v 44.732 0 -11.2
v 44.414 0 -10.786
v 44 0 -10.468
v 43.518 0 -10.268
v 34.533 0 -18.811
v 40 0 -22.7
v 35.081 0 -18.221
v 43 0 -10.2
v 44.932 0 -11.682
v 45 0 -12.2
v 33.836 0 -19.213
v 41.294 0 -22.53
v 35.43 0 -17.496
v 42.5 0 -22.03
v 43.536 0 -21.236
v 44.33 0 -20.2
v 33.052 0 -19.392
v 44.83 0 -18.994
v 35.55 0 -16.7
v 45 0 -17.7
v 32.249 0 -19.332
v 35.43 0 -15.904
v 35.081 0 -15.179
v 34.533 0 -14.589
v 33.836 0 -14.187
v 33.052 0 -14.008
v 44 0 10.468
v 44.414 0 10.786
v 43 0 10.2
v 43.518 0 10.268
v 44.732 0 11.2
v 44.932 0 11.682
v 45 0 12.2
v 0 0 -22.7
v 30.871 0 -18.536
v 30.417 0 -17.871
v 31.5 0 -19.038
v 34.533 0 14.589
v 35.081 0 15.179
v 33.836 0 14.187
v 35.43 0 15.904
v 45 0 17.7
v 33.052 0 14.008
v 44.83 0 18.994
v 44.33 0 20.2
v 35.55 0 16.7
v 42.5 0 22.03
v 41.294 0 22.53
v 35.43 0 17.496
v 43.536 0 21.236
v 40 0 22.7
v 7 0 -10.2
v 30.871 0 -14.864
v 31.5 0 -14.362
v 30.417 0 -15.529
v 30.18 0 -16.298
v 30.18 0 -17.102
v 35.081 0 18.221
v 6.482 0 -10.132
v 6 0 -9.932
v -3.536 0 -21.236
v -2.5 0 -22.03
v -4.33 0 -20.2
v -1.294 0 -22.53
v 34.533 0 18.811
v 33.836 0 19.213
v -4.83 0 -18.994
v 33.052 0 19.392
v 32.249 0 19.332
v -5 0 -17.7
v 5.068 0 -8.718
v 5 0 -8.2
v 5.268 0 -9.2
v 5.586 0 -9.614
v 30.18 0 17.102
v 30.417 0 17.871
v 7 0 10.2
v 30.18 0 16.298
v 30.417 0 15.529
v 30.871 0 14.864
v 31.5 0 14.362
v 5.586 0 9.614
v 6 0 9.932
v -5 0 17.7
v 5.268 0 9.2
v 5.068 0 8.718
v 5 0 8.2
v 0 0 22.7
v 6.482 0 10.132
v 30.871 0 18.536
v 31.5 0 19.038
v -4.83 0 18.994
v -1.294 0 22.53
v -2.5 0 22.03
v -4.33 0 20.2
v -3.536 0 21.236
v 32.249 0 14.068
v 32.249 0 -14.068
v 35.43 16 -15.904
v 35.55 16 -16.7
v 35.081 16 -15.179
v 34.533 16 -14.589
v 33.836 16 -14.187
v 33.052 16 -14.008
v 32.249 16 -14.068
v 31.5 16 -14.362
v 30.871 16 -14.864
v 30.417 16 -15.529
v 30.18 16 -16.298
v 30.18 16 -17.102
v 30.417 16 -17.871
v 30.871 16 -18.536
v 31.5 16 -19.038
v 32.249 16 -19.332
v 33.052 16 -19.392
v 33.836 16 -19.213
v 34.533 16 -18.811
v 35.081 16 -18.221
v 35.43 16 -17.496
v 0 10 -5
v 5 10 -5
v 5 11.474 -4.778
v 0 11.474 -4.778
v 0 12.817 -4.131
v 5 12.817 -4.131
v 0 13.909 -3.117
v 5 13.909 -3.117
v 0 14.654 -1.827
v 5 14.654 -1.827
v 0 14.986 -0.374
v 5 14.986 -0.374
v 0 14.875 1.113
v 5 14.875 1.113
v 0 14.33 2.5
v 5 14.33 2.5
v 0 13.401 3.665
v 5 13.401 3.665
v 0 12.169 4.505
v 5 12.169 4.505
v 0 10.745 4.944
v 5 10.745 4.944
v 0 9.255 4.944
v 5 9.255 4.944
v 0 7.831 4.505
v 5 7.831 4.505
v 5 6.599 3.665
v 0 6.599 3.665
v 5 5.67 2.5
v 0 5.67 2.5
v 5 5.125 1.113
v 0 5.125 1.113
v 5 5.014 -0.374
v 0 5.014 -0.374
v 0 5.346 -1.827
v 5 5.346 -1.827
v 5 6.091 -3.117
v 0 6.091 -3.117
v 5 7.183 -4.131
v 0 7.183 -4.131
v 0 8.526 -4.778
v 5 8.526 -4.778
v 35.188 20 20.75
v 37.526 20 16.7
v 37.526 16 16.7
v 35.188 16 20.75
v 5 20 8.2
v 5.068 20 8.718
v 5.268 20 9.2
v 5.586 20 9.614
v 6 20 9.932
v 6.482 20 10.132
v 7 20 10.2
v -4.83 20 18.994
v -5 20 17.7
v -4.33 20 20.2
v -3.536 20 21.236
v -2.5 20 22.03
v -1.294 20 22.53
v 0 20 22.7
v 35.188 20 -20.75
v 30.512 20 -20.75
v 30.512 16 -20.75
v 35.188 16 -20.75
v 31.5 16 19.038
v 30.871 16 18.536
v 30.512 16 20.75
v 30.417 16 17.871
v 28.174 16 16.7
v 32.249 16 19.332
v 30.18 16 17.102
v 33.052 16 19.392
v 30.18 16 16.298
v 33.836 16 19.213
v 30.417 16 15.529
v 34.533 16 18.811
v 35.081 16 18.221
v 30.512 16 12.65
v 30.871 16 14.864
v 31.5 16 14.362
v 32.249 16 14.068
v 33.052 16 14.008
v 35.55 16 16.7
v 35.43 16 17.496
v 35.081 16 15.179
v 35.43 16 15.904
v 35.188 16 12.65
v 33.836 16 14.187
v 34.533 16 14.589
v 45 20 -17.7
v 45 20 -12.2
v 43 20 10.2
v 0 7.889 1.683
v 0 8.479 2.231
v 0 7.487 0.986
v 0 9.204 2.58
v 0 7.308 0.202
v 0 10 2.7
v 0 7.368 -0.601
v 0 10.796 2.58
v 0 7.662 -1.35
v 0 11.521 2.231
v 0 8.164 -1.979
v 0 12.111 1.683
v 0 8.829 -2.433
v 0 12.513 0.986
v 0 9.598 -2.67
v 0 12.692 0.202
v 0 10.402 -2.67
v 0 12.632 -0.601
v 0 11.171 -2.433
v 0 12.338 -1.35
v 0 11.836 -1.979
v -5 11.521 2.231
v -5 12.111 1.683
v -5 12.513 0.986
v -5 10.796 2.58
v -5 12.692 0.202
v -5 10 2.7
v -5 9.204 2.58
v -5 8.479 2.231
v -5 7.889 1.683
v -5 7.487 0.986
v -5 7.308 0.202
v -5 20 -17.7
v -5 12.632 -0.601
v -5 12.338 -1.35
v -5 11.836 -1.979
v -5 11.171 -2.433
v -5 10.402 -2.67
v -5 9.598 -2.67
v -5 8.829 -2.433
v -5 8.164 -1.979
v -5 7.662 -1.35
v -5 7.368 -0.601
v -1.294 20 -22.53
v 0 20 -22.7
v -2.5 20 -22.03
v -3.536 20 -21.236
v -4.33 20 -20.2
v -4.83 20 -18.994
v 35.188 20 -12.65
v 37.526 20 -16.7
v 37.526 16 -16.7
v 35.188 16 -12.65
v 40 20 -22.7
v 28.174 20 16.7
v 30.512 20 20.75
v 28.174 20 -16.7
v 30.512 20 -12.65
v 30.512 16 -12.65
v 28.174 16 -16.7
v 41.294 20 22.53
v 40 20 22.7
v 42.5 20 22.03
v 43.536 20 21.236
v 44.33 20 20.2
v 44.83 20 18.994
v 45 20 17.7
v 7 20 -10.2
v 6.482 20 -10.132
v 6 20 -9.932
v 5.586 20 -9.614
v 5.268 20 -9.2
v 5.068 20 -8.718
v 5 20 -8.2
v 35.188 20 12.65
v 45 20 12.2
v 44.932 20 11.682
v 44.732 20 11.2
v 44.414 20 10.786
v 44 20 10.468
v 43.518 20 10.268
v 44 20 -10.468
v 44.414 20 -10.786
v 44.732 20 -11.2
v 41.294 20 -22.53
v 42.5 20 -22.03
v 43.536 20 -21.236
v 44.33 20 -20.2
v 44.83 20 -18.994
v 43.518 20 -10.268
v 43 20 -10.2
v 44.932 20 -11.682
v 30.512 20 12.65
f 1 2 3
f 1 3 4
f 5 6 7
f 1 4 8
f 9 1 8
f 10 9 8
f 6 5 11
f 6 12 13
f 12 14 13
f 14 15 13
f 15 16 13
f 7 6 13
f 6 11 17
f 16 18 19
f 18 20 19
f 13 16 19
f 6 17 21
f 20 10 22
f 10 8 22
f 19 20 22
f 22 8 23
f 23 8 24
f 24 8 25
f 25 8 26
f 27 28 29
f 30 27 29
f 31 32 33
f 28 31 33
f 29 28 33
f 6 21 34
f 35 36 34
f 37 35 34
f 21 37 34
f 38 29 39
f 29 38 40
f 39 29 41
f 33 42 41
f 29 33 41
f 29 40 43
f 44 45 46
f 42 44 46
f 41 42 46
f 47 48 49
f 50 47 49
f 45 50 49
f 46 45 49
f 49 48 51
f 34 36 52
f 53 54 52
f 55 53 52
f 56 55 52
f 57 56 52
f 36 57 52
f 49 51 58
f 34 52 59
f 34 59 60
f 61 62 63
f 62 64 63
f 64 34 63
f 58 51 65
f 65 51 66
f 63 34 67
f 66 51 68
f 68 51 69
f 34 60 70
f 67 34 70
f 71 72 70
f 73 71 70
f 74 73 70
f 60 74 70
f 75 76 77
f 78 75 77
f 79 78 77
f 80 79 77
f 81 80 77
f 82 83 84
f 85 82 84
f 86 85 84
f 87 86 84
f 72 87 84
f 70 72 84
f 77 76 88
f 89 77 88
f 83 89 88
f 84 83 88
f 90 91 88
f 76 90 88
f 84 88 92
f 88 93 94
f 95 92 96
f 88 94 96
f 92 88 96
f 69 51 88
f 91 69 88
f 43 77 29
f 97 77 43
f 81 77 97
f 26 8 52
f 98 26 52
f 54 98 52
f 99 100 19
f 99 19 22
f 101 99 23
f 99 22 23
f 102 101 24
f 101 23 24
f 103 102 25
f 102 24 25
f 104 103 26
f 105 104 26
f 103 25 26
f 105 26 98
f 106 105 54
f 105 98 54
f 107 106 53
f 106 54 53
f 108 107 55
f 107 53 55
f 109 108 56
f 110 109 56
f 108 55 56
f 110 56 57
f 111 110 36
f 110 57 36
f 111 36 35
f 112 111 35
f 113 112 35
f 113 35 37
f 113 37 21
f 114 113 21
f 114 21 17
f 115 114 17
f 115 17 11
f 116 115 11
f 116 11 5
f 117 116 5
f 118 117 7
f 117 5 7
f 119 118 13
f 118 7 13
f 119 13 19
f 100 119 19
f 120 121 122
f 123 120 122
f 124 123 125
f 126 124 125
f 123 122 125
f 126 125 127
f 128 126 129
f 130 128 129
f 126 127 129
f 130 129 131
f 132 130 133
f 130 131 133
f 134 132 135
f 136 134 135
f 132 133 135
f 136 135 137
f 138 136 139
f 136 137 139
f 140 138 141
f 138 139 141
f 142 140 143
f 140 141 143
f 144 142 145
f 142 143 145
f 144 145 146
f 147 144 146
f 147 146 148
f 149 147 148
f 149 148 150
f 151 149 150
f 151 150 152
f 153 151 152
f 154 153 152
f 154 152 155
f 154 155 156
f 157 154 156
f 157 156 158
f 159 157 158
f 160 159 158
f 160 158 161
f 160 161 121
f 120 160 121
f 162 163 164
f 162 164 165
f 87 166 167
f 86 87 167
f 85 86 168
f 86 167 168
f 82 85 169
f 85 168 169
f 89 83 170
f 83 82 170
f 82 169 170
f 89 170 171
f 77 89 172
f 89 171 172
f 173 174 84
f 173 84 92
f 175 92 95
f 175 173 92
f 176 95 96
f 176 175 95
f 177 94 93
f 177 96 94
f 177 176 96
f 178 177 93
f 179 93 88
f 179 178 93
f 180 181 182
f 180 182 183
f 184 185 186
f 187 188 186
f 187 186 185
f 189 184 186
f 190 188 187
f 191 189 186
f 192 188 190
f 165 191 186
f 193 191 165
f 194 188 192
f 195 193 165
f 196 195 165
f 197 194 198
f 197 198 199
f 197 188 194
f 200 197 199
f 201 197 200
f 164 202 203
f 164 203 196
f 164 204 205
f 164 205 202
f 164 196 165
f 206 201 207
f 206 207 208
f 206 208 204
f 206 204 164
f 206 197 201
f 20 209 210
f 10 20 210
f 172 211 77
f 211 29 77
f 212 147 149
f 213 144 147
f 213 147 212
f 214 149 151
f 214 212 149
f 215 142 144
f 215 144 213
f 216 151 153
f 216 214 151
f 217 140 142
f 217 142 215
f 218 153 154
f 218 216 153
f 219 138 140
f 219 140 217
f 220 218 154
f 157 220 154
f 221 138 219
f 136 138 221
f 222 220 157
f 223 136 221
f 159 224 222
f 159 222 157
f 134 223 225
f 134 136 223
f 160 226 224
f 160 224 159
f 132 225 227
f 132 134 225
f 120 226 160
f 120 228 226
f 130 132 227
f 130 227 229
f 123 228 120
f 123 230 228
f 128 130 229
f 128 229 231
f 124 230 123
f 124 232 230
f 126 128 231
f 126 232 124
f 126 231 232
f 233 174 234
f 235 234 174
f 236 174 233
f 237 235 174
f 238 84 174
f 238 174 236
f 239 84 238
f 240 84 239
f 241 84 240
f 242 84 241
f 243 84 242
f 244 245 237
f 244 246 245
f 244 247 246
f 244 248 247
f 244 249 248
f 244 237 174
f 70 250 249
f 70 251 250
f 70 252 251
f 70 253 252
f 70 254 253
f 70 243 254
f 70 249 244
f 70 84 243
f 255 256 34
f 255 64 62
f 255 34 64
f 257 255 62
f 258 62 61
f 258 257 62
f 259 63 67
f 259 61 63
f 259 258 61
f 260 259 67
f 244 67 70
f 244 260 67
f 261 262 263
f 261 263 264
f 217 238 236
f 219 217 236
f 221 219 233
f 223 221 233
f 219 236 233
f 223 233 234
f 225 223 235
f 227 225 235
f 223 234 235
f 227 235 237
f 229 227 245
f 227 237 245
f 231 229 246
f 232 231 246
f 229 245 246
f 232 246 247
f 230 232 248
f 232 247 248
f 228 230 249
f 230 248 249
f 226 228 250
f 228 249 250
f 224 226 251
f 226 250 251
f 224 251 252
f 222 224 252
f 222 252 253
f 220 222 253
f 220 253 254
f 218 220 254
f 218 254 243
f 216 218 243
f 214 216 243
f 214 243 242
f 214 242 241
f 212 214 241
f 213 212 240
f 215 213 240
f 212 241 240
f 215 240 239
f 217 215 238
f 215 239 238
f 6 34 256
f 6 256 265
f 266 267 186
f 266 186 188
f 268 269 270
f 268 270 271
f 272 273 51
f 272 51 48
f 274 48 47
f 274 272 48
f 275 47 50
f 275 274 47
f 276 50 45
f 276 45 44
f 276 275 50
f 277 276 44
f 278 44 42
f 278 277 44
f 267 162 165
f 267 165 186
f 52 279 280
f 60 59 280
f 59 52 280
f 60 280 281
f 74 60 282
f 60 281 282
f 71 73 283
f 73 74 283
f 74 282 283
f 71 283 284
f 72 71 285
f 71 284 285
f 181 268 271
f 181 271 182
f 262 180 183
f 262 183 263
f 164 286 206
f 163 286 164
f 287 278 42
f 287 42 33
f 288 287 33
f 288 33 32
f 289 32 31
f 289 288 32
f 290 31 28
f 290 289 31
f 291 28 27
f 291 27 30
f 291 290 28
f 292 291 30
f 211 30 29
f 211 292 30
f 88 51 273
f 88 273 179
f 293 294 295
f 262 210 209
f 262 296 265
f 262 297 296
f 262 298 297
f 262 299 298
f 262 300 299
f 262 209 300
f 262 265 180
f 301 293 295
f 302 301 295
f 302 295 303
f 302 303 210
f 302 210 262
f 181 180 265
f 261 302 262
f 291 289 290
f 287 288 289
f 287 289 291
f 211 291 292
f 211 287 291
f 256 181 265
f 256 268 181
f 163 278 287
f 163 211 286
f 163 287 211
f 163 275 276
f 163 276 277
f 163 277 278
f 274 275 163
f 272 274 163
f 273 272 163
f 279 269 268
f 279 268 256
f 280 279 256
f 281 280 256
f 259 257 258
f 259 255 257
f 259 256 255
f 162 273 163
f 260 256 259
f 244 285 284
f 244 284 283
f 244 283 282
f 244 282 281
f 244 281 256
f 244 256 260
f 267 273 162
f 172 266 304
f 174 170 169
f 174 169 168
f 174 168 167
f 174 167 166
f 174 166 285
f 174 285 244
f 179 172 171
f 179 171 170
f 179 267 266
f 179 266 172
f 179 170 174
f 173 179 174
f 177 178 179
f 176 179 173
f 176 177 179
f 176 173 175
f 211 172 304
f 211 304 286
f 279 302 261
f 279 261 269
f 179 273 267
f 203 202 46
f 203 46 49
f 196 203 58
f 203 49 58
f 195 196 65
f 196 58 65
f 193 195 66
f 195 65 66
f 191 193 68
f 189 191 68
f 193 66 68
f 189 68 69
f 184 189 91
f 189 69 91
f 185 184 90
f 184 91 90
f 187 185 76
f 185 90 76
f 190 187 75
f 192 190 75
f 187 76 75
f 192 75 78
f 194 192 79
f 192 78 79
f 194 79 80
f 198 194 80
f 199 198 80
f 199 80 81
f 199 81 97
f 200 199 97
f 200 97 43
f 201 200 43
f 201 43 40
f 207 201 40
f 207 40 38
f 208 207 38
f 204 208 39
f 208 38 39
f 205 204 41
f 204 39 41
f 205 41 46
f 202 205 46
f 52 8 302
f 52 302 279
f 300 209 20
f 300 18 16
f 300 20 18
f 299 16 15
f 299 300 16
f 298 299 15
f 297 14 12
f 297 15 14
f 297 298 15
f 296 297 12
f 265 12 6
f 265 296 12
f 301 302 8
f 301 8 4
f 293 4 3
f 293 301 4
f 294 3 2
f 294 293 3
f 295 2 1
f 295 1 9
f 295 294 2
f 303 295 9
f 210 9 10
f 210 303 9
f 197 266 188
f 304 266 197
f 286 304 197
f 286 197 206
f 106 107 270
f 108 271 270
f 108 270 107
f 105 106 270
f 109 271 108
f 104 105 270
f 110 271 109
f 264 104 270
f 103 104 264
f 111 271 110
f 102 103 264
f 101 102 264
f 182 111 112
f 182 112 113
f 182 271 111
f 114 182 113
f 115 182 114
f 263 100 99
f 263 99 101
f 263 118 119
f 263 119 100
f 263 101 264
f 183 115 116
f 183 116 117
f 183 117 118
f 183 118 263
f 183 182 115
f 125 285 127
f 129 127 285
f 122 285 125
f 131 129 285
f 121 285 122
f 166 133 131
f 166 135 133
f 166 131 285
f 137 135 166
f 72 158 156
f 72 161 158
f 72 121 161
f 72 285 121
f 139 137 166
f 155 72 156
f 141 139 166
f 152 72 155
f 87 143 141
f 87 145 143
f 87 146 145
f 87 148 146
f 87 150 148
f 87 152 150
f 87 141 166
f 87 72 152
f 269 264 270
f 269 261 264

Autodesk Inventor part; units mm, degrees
ref_plane "YZ Plane" through (0, 0, 0) normal (1, 0, 0) x (0, 1, 0)
ref_plane "XZ Plane" through (0, 0, 0) normal (0, 1, 0) x (-1, 0, 0)
ref_plane "XY Plane" through (0, 0, 0) normal (0, 0, 1) x (1, 0, 0)
sketch "Boceto1" plane through (0, 0, 0) normal (0, 1, 0) x (-1, 0, 0)
  line L0 (-5, 22.7) -> (5, 22.7)
  line L1 (5, 22.7) -> (5, -22.7)
  line L2 (5, -22.7) -> (-5, -22.7)
  line L3 (-5, -22.7) -> (-5, 22.7)
  line L4 (-5, 22.7) -> (5, -22.7) construction
  line L5 (5, 22.7) -> (-5, -22.7) construction
  line L6 (5, 22.7) -> (-45, 22.7)
  line L7 (-45, 22.7) -> (-45, 10.2)
  line L8 (-45, 10.2) -> (5, 10.2)
  line L9 (5, 10.2) -> (5, 22.7)
  line L10 (5, -22.7) -> (-45, -22.7)
  line L11 (-45, -22.7) -> (-45, -10.2)
  line L12 (-45, -10.2) -> (5, -10.2)
  line L13 (5, -10.2) -> (5, -22.7)
  point P0 (0, 0)
  point P1 (-5, 10.2)
  point P2 (-5, -10.2)
  point P3 (-5, -22.7)
  dimension "d0" = 20.4
  dimension "d1" = 45.4
  dimension "d2" = 50
  dimension "d3" = 10
extrude "Extrusión1" add sketch "Boceto1" along normal blind 20
sketch "Boceto2" plane through (-5, 0, -22.7) normal (-1, 0, 0) x (0, 0, 1)
  circle A0 centre (22.7, 10) radius 2.7
  line L0 (0, 0) -> (45.4, 0) projected
  point P0 (22.7, 0)
  dimension "d6" = 5.4
  dimension "d7" = 10
extrude "Extrusión2" cut sketch "Boceto2" against normal through all
sketch "Boceto3" plane through (5, 0, 10.2) normal (1, 0, 0) x (0, 0, -1)
  point P0 (10.2, 0)
fillet "Empalme1" radius 5 2 edges at (-5, 10, -22.7) (-5, 10, 22.7)
sketch "Boceto4" plane through (0, 0, 0) normal (0, -1, 0) x (1, 0, 0)
  circle A0 centre (32.85, -16.7) radius 2.7
  circle A1 centre (32.85, 16.7) radius 2.7
  line L0 (45, -22.7) -> (0, -22.7) projected
  line L1 (0, 22.7) -> (45, 22.7) projected
  line L2 (45, 22.7) -> (45, 10.2) projected
  point P0 (0, 0)
  dimension "d11" = 6
  dimension "d12" = 6
  dimension "d13" = 5.4
  dimension "d19" = 12.15
extrude "Extrusión3" cut sketch "Boceto4" against normal through all
sketch "Boceto5" plane through (0, 20, 0) normal (0, 1, 0) x (1, 0, 0)
  circle A0 centre (32.85, 16.7) radius 2.7 projected
  circle A1 centre (32.85, 16.7) radius 4.05
  circle A2 centre (32.85, -16.7) radius 2.7 projected
  circle A3 centre (32.85, -16.7) radius 4.05
  line L0 (37.5265, 16.7) -> (35.1883, 12.65)
  line L1 (35.1883, 12.65) -> (30.5117, 12.65)
  line L2 (30.5117, 12.65) -> (28.1735, 16.7)
  line L3 (28.1735, 16.7) -> (30.5117, 20.75)
  line L4 (30.5117, 20.75) -> (35.1883, 20.75)
  line L5 (35.1883, 20.75) -> (37.5265, 16.7)
  line L6 (37.5265, -12.2178) -> (39.07, -18.5089)
  line L7 (39.07, -18.5089) -> (34.3935, -22.9911)
  line L8 (34.3935, -22.9911) -> (28.1735, -21.1822)
  line L9 (28.1735, -21.1822) -> (26.63, -14.8911)
  line L10 (26.63, -14.8911) -> (31.3065, -10.4089)
  line L11 (31.3065, -10.4089) -> (37.5265, -12.2178)
  line L12 (30.5117, -20.75) -> (28.1735, -16.7)
  line L13 (28.1735, -16.7) -> (30.5117, -12.65)
  line L14 (30.5117, -12.65) -> (35.1883, -12.65)
  line L15 (35.1883, -12.65) -> (37.5265, -16.7)
  line L16 (37.5265, -16.7) -> (35.1883, -20.75)
  line L17 (35.1883, -20.75) -> (30.5117, -20.75)
  line L18 (0, -22.7) -> (45, -22.7) projected
  point P0 (0, 0)
  dimension "d16" = 8.1
extrude "Extrusión4" cut sketch "Boceto5" against normal blind 4 contours A0 | A1 | A1 L5 L0 | A1 L4 L5 | L0 L1 A1 | A1 L3 L4 | L1 L2 A1 | A1 L2 L3 | A2 | A3 | A3 L15 L16 | A3 L14 L15 | L16 L17 A3 | A3 L13 L14 | L17 L12 A3 | A3 L12 L13
fillet "Empalme2" radius 5 2 edges at (45, 10, 22.7) (45, 10, -22.7)
sketch "Boceto6" plane through (5, 0, 10.2) normal (1, 0, 0) x (0, 0, -1)
  circle A0 centre (10.2, 10) radius 2.7 projected
  circle A1 centre (10.2, 10) radius 5
  point P0 (10.2, 0)
  dimension "d21" = 10
extrude "Extrusión5" cut sketch "Boceto6" against normal blind 5 contours A0 | A1
fillet "Empalme3" radius 2 4 edges at (5, 10, -10.2) (5, 10, 10.2) (45, 10, 10.2) (45, 10, -10.2)
properties part number "Tensor"
